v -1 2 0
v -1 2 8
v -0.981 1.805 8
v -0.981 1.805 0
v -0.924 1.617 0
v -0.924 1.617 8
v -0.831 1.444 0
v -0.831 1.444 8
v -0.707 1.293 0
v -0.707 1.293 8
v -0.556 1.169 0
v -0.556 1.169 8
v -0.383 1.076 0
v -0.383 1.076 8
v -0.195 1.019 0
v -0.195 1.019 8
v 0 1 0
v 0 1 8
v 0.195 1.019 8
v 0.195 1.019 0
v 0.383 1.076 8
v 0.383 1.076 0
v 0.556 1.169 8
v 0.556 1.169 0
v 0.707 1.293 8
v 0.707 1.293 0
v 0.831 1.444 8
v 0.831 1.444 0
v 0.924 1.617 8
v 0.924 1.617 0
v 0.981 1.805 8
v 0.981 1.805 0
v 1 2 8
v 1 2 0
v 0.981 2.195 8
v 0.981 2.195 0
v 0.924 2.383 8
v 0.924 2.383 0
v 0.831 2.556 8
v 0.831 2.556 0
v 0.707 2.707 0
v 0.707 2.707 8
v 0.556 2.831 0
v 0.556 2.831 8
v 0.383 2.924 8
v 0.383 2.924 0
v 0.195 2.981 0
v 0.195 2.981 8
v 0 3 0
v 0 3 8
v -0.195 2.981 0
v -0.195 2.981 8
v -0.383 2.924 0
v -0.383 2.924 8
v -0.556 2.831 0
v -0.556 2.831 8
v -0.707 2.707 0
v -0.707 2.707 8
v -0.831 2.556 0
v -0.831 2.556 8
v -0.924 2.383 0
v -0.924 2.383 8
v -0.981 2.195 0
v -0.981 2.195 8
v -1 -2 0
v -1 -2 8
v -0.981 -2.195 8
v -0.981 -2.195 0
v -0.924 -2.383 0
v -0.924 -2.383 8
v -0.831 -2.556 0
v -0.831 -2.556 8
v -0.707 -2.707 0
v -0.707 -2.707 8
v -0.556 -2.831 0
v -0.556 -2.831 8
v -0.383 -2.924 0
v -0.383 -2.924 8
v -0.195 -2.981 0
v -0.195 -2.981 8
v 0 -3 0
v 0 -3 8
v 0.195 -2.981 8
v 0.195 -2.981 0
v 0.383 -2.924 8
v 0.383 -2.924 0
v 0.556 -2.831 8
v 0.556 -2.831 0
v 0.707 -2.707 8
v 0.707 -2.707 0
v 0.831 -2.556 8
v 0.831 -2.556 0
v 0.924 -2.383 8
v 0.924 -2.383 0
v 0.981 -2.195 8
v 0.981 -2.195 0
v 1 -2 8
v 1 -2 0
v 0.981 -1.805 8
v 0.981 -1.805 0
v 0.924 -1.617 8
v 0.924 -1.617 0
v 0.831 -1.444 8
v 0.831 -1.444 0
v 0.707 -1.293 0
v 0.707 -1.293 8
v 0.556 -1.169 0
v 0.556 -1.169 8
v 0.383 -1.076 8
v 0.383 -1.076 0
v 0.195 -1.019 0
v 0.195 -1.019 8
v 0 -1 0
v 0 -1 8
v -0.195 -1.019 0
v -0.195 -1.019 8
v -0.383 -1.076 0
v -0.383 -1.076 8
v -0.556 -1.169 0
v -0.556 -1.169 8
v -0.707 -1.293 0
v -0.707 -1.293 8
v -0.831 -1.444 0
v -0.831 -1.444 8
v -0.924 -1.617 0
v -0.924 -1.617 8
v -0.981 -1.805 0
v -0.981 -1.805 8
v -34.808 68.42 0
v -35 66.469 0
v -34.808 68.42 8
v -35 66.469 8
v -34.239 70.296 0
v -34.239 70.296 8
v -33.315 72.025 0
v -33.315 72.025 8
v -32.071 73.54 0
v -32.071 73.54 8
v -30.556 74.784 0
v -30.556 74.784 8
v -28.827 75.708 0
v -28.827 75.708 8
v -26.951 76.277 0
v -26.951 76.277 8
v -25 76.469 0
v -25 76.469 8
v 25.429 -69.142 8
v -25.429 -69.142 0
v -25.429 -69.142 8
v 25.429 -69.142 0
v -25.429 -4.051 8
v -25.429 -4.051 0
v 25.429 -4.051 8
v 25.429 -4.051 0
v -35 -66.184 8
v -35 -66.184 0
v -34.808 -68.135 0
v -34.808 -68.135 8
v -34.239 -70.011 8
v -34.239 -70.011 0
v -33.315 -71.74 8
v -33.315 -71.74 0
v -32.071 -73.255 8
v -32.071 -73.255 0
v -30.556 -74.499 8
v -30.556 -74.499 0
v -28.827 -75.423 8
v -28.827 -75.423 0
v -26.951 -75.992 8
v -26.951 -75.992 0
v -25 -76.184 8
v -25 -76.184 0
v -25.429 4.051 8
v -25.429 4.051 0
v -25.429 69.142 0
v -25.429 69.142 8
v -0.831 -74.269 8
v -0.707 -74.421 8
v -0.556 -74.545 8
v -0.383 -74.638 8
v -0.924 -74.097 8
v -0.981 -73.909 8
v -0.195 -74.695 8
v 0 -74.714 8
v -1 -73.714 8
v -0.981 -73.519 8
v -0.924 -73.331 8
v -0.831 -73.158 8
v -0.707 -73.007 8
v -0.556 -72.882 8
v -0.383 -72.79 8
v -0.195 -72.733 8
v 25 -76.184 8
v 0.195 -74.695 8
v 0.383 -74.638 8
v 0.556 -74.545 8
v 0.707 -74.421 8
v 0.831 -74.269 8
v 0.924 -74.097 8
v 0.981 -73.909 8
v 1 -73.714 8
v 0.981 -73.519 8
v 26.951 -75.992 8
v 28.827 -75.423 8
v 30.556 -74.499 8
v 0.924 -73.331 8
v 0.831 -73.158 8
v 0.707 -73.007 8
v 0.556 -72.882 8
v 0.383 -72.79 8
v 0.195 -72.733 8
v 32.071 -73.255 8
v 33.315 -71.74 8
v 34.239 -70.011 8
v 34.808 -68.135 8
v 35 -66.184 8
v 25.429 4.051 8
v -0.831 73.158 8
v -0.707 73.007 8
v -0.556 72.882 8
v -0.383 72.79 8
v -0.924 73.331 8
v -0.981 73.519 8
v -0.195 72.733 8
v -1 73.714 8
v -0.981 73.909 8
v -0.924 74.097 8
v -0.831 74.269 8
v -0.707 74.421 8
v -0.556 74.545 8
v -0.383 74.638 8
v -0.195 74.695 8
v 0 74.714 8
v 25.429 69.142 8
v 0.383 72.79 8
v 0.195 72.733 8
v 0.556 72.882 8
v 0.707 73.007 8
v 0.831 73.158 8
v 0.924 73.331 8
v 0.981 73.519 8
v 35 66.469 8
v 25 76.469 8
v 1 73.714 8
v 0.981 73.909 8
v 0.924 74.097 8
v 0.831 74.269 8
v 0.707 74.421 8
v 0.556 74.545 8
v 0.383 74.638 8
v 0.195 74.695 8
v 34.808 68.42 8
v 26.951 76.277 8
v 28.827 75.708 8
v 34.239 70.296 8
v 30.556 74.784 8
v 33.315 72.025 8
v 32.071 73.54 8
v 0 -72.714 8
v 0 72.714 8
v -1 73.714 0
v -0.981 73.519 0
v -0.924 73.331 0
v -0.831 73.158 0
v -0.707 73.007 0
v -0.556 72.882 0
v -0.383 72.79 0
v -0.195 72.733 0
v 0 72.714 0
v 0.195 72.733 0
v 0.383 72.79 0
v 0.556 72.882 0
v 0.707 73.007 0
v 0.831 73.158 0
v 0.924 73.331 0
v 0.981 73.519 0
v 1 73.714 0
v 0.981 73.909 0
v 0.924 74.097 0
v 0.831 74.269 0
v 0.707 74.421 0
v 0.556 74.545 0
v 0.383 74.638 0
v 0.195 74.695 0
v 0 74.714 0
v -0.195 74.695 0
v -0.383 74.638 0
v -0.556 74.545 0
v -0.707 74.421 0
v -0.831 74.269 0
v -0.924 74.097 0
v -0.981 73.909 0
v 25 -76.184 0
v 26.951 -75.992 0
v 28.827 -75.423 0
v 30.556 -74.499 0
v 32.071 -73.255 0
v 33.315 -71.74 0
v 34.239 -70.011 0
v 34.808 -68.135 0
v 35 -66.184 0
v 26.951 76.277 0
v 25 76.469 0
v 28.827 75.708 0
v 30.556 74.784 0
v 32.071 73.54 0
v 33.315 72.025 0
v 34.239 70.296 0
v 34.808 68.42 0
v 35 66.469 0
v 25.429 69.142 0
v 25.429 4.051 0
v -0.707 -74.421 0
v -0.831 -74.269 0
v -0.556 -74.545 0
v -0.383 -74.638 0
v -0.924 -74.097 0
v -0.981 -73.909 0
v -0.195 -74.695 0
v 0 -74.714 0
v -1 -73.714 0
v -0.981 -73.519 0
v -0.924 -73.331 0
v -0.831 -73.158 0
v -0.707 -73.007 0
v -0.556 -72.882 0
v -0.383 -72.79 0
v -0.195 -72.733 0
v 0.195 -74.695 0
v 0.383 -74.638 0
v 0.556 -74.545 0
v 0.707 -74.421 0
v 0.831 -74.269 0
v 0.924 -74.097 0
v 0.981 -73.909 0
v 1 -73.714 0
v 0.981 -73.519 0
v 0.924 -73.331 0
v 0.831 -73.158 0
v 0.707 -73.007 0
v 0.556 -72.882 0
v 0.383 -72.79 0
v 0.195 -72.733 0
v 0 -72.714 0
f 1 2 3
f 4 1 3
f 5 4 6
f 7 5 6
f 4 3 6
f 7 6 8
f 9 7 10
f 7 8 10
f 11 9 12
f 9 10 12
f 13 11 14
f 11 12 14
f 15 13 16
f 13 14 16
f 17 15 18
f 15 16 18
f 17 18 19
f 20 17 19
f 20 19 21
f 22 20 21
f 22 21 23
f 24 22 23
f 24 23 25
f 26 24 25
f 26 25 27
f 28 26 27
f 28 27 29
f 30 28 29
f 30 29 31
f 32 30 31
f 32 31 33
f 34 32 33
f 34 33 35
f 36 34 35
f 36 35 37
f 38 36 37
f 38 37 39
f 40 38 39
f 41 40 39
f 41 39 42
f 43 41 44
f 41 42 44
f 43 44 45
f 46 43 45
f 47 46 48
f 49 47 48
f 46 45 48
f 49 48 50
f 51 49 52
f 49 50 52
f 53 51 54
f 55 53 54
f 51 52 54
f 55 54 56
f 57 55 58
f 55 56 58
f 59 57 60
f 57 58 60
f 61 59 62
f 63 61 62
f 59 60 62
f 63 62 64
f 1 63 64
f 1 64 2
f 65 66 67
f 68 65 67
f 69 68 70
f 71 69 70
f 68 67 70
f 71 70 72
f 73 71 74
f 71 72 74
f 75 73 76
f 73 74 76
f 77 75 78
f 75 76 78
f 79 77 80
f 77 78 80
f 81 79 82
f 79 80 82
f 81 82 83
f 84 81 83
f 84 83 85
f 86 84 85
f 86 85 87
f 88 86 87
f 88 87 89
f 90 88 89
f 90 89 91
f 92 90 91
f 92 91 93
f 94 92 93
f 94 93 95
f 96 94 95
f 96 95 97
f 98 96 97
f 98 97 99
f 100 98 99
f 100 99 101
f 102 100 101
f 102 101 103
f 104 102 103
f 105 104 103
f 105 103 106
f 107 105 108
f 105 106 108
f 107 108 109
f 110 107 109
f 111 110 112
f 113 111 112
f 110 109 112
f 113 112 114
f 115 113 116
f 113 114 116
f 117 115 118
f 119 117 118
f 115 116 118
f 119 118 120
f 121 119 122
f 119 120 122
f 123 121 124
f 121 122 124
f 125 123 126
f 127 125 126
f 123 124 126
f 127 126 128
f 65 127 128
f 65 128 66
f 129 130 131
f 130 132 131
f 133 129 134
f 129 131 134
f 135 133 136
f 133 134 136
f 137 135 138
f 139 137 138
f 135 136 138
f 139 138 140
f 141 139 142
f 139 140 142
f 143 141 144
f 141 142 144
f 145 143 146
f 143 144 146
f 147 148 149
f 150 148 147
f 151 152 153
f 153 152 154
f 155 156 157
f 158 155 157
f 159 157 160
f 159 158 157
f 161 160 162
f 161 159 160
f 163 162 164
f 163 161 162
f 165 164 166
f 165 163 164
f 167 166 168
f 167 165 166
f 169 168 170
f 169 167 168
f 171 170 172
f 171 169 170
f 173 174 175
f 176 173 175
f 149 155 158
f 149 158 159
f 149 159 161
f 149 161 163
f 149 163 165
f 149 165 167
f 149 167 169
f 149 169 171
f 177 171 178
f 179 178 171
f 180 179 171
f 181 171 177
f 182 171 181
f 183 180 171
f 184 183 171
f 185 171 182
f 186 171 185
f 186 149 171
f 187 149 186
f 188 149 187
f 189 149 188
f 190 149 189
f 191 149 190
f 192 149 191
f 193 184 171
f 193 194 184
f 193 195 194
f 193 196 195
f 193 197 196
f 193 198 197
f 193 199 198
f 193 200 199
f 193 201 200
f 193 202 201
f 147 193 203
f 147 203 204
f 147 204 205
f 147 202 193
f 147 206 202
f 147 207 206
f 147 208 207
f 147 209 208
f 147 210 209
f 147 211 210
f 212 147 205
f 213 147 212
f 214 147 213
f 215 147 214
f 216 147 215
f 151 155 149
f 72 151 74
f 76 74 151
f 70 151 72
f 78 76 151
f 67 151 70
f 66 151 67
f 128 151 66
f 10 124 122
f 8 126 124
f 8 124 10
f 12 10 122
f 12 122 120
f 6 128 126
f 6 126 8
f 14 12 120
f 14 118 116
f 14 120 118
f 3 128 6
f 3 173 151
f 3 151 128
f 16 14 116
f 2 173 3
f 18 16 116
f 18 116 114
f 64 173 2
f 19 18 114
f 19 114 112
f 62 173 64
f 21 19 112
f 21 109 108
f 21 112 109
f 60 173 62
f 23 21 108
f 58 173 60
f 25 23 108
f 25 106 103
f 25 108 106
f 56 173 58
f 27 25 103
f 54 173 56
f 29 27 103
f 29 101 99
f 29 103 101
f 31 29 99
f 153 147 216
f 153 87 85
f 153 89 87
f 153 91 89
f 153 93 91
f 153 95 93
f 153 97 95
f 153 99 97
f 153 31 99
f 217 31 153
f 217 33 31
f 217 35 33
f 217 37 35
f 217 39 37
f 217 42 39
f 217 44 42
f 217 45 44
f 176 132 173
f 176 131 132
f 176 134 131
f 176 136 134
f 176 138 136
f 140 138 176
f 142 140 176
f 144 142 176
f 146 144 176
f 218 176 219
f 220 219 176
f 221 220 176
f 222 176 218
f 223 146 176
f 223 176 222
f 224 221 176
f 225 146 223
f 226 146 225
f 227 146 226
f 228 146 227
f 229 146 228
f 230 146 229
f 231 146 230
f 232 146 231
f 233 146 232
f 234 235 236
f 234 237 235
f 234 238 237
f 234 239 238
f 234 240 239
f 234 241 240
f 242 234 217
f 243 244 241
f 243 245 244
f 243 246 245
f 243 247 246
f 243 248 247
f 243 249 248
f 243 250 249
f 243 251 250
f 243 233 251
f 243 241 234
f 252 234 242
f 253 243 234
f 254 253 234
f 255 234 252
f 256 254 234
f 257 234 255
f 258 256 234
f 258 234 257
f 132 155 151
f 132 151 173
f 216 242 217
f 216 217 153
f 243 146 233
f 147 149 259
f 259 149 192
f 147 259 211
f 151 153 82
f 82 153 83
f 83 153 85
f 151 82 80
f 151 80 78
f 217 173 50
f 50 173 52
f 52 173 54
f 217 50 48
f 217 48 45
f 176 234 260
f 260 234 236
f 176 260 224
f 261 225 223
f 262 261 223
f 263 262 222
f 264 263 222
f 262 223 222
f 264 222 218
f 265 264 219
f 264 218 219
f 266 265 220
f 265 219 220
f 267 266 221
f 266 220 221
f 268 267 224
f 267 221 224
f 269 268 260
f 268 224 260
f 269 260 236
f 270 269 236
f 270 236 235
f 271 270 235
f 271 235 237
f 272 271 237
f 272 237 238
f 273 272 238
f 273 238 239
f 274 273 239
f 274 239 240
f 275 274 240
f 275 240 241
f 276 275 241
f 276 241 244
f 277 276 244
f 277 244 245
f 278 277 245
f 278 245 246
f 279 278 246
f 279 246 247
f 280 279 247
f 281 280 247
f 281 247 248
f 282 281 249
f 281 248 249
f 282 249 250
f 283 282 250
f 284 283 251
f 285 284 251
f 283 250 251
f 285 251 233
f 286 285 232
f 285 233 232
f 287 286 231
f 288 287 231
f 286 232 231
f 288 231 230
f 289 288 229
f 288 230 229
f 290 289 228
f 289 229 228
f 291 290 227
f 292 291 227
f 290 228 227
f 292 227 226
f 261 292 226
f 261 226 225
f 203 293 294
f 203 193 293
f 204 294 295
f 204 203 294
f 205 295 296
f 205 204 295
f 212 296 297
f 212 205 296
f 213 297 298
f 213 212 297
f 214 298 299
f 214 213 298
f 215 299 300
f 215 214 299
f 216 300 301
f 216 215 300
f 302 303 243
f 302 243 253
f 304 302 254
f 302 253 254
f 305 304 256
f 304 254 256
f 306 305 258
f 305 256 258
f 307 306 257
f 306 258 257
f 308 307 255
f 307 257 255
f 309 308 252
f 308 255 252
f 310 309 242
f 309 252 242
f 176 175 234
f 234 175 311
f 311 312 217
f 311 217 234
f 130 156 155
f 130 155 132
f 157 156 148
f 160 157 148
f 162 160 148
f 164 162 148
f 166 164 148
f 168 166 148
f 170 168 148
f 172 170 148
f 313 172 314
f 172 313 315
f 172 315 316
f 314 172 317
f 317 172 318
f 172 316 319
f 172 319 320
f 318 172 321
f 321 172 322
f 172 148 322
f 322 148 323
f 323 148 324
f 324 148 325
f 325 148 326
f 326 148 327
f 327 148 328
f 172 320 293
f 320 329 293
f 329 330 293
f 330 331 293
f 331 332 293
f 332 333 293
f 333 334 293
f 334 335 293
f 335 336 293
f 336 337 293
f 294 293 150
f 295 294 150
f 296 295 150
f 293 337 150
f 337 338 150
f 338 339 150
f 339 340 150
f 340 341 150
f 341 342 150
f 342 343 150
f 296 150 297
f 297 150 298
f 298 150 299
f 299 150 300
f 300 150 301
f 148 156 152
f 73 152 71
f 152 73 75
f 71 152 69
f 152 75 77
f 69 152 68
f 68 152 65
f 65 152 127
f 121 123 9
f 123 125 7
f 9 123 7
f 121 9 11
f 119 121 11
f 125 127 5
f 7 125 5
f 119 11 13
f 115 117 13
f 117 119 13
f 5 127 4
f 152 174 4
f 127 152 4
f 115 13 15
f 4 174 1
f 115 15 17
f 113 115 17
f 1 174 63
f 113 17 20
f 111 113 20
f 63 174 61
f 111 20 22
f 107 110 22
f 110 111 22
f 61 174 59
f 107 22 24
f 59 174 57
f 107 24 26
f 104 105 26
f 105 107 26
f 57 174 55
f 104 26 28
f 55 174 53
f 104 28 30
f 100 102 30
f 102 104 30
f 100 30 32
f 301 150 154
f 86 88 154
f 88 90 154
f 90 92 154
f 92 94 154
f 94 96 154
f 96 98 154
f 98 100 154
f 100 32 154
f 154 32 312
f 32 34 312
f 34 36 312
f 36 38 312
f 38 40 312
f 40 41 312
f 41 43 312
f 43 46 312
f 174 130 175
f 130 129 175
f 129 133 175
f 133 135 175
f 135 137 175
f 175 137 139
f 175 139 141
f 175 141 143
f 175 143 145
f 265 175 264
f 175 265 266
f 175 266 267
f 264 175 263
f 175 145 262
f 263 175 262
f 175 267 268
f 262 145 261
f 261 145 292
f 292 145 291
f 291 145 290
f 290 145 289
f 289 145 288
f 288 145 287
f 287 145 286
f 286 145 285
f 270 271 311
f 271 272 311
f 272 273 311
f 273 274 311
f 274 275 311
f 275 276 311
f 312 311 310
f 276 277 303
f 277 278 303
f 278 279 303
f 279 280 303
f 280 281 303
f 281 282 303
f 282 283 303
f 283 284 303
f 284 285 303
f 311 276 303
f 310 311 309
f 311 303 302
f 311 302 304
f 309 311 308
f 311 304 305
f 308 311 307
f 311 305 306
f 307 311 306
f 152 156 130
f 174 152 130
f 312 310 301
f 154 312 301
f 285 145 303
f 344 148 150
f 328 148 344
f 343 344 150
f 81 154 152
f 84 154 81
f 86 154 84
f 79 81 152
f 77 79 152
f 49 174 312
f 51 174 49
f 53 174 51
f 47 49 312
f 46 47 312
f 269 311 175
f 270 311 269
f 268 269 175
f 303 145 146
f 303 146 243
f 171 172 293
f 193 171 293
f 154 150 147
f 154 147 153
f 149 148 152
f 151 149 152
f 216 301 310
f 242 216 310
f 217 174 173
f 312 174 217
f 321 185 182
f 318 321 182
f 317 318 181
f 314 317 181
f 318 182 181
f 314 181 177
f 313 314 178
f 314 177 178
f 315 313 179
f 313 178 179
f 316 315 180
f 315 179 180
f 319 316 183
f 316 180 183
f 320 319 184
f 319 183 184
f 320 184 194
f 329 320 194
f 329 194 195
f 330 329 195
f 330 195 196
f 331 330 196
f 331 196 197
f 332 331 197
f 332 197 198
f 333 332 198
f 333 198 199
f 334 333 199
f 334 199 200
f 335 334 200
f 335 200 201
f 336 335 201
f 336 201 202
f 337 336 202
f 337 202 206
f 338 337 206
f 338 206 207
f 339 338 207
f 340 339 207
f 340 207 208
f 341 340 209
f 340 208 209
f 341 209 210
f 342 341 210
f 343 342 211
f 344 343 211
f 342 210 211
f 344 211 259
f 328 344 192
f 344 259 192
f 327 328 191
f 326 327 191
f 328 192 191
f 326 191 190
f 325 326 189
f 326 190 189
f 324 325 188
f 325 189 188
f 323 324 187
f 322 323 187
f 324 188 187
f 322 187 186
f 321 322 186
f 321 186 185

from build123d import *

# Parameters (mm, degrees)
F0_W     = 70
F0_H     = 152.653071
F0_W_2   = 50.857146
F0_H_2   = 65.091088
F1_DEPTH = 8
F2_D     = 2
F2_DEPTH = 50
F3_R     = 10


with BuildPart() as f1:
    # F0 (on Top) → F1 (new body)
    with BuildSketch(Plane.XY):
        with Locations((0, 0.142402)):
            Rectangle(F0_W, F0_H)
        with Locations((0, -36.596865)):
            Rectangle(F0_W_2, F0_H_2, mode=Mode.SUBTRACT)
        with Locations((0, 36.596865)):
            Rectangle(F0_W_2, F0_H_2, mode=Mode.SUBTRACT)
    extrude(amount=F1_DEPTH)

    # F2
    with Locations(Plane(origin=(0, 0, 0), x_dir=(1, 0, 0), z_dir=(0, 0, -1))):
        with Locations((0, 2), (0, -2), (0, 73.713833), (0, -73.713833)):
            Hole(F2_D / 2, depth=F2_DEPTH)

    # F3
    f3_edges = [f1.edges().sort_by_distance(p)[0] for p in [
        (-35, 76.468938, 4),
        (35, 76.468938, 4),
        (-35, -76.184133, 4),
        (35, -76.184133, 4),
    ]]
    fillet(f3_edges, radius=F3_R)


solid = f1.part
